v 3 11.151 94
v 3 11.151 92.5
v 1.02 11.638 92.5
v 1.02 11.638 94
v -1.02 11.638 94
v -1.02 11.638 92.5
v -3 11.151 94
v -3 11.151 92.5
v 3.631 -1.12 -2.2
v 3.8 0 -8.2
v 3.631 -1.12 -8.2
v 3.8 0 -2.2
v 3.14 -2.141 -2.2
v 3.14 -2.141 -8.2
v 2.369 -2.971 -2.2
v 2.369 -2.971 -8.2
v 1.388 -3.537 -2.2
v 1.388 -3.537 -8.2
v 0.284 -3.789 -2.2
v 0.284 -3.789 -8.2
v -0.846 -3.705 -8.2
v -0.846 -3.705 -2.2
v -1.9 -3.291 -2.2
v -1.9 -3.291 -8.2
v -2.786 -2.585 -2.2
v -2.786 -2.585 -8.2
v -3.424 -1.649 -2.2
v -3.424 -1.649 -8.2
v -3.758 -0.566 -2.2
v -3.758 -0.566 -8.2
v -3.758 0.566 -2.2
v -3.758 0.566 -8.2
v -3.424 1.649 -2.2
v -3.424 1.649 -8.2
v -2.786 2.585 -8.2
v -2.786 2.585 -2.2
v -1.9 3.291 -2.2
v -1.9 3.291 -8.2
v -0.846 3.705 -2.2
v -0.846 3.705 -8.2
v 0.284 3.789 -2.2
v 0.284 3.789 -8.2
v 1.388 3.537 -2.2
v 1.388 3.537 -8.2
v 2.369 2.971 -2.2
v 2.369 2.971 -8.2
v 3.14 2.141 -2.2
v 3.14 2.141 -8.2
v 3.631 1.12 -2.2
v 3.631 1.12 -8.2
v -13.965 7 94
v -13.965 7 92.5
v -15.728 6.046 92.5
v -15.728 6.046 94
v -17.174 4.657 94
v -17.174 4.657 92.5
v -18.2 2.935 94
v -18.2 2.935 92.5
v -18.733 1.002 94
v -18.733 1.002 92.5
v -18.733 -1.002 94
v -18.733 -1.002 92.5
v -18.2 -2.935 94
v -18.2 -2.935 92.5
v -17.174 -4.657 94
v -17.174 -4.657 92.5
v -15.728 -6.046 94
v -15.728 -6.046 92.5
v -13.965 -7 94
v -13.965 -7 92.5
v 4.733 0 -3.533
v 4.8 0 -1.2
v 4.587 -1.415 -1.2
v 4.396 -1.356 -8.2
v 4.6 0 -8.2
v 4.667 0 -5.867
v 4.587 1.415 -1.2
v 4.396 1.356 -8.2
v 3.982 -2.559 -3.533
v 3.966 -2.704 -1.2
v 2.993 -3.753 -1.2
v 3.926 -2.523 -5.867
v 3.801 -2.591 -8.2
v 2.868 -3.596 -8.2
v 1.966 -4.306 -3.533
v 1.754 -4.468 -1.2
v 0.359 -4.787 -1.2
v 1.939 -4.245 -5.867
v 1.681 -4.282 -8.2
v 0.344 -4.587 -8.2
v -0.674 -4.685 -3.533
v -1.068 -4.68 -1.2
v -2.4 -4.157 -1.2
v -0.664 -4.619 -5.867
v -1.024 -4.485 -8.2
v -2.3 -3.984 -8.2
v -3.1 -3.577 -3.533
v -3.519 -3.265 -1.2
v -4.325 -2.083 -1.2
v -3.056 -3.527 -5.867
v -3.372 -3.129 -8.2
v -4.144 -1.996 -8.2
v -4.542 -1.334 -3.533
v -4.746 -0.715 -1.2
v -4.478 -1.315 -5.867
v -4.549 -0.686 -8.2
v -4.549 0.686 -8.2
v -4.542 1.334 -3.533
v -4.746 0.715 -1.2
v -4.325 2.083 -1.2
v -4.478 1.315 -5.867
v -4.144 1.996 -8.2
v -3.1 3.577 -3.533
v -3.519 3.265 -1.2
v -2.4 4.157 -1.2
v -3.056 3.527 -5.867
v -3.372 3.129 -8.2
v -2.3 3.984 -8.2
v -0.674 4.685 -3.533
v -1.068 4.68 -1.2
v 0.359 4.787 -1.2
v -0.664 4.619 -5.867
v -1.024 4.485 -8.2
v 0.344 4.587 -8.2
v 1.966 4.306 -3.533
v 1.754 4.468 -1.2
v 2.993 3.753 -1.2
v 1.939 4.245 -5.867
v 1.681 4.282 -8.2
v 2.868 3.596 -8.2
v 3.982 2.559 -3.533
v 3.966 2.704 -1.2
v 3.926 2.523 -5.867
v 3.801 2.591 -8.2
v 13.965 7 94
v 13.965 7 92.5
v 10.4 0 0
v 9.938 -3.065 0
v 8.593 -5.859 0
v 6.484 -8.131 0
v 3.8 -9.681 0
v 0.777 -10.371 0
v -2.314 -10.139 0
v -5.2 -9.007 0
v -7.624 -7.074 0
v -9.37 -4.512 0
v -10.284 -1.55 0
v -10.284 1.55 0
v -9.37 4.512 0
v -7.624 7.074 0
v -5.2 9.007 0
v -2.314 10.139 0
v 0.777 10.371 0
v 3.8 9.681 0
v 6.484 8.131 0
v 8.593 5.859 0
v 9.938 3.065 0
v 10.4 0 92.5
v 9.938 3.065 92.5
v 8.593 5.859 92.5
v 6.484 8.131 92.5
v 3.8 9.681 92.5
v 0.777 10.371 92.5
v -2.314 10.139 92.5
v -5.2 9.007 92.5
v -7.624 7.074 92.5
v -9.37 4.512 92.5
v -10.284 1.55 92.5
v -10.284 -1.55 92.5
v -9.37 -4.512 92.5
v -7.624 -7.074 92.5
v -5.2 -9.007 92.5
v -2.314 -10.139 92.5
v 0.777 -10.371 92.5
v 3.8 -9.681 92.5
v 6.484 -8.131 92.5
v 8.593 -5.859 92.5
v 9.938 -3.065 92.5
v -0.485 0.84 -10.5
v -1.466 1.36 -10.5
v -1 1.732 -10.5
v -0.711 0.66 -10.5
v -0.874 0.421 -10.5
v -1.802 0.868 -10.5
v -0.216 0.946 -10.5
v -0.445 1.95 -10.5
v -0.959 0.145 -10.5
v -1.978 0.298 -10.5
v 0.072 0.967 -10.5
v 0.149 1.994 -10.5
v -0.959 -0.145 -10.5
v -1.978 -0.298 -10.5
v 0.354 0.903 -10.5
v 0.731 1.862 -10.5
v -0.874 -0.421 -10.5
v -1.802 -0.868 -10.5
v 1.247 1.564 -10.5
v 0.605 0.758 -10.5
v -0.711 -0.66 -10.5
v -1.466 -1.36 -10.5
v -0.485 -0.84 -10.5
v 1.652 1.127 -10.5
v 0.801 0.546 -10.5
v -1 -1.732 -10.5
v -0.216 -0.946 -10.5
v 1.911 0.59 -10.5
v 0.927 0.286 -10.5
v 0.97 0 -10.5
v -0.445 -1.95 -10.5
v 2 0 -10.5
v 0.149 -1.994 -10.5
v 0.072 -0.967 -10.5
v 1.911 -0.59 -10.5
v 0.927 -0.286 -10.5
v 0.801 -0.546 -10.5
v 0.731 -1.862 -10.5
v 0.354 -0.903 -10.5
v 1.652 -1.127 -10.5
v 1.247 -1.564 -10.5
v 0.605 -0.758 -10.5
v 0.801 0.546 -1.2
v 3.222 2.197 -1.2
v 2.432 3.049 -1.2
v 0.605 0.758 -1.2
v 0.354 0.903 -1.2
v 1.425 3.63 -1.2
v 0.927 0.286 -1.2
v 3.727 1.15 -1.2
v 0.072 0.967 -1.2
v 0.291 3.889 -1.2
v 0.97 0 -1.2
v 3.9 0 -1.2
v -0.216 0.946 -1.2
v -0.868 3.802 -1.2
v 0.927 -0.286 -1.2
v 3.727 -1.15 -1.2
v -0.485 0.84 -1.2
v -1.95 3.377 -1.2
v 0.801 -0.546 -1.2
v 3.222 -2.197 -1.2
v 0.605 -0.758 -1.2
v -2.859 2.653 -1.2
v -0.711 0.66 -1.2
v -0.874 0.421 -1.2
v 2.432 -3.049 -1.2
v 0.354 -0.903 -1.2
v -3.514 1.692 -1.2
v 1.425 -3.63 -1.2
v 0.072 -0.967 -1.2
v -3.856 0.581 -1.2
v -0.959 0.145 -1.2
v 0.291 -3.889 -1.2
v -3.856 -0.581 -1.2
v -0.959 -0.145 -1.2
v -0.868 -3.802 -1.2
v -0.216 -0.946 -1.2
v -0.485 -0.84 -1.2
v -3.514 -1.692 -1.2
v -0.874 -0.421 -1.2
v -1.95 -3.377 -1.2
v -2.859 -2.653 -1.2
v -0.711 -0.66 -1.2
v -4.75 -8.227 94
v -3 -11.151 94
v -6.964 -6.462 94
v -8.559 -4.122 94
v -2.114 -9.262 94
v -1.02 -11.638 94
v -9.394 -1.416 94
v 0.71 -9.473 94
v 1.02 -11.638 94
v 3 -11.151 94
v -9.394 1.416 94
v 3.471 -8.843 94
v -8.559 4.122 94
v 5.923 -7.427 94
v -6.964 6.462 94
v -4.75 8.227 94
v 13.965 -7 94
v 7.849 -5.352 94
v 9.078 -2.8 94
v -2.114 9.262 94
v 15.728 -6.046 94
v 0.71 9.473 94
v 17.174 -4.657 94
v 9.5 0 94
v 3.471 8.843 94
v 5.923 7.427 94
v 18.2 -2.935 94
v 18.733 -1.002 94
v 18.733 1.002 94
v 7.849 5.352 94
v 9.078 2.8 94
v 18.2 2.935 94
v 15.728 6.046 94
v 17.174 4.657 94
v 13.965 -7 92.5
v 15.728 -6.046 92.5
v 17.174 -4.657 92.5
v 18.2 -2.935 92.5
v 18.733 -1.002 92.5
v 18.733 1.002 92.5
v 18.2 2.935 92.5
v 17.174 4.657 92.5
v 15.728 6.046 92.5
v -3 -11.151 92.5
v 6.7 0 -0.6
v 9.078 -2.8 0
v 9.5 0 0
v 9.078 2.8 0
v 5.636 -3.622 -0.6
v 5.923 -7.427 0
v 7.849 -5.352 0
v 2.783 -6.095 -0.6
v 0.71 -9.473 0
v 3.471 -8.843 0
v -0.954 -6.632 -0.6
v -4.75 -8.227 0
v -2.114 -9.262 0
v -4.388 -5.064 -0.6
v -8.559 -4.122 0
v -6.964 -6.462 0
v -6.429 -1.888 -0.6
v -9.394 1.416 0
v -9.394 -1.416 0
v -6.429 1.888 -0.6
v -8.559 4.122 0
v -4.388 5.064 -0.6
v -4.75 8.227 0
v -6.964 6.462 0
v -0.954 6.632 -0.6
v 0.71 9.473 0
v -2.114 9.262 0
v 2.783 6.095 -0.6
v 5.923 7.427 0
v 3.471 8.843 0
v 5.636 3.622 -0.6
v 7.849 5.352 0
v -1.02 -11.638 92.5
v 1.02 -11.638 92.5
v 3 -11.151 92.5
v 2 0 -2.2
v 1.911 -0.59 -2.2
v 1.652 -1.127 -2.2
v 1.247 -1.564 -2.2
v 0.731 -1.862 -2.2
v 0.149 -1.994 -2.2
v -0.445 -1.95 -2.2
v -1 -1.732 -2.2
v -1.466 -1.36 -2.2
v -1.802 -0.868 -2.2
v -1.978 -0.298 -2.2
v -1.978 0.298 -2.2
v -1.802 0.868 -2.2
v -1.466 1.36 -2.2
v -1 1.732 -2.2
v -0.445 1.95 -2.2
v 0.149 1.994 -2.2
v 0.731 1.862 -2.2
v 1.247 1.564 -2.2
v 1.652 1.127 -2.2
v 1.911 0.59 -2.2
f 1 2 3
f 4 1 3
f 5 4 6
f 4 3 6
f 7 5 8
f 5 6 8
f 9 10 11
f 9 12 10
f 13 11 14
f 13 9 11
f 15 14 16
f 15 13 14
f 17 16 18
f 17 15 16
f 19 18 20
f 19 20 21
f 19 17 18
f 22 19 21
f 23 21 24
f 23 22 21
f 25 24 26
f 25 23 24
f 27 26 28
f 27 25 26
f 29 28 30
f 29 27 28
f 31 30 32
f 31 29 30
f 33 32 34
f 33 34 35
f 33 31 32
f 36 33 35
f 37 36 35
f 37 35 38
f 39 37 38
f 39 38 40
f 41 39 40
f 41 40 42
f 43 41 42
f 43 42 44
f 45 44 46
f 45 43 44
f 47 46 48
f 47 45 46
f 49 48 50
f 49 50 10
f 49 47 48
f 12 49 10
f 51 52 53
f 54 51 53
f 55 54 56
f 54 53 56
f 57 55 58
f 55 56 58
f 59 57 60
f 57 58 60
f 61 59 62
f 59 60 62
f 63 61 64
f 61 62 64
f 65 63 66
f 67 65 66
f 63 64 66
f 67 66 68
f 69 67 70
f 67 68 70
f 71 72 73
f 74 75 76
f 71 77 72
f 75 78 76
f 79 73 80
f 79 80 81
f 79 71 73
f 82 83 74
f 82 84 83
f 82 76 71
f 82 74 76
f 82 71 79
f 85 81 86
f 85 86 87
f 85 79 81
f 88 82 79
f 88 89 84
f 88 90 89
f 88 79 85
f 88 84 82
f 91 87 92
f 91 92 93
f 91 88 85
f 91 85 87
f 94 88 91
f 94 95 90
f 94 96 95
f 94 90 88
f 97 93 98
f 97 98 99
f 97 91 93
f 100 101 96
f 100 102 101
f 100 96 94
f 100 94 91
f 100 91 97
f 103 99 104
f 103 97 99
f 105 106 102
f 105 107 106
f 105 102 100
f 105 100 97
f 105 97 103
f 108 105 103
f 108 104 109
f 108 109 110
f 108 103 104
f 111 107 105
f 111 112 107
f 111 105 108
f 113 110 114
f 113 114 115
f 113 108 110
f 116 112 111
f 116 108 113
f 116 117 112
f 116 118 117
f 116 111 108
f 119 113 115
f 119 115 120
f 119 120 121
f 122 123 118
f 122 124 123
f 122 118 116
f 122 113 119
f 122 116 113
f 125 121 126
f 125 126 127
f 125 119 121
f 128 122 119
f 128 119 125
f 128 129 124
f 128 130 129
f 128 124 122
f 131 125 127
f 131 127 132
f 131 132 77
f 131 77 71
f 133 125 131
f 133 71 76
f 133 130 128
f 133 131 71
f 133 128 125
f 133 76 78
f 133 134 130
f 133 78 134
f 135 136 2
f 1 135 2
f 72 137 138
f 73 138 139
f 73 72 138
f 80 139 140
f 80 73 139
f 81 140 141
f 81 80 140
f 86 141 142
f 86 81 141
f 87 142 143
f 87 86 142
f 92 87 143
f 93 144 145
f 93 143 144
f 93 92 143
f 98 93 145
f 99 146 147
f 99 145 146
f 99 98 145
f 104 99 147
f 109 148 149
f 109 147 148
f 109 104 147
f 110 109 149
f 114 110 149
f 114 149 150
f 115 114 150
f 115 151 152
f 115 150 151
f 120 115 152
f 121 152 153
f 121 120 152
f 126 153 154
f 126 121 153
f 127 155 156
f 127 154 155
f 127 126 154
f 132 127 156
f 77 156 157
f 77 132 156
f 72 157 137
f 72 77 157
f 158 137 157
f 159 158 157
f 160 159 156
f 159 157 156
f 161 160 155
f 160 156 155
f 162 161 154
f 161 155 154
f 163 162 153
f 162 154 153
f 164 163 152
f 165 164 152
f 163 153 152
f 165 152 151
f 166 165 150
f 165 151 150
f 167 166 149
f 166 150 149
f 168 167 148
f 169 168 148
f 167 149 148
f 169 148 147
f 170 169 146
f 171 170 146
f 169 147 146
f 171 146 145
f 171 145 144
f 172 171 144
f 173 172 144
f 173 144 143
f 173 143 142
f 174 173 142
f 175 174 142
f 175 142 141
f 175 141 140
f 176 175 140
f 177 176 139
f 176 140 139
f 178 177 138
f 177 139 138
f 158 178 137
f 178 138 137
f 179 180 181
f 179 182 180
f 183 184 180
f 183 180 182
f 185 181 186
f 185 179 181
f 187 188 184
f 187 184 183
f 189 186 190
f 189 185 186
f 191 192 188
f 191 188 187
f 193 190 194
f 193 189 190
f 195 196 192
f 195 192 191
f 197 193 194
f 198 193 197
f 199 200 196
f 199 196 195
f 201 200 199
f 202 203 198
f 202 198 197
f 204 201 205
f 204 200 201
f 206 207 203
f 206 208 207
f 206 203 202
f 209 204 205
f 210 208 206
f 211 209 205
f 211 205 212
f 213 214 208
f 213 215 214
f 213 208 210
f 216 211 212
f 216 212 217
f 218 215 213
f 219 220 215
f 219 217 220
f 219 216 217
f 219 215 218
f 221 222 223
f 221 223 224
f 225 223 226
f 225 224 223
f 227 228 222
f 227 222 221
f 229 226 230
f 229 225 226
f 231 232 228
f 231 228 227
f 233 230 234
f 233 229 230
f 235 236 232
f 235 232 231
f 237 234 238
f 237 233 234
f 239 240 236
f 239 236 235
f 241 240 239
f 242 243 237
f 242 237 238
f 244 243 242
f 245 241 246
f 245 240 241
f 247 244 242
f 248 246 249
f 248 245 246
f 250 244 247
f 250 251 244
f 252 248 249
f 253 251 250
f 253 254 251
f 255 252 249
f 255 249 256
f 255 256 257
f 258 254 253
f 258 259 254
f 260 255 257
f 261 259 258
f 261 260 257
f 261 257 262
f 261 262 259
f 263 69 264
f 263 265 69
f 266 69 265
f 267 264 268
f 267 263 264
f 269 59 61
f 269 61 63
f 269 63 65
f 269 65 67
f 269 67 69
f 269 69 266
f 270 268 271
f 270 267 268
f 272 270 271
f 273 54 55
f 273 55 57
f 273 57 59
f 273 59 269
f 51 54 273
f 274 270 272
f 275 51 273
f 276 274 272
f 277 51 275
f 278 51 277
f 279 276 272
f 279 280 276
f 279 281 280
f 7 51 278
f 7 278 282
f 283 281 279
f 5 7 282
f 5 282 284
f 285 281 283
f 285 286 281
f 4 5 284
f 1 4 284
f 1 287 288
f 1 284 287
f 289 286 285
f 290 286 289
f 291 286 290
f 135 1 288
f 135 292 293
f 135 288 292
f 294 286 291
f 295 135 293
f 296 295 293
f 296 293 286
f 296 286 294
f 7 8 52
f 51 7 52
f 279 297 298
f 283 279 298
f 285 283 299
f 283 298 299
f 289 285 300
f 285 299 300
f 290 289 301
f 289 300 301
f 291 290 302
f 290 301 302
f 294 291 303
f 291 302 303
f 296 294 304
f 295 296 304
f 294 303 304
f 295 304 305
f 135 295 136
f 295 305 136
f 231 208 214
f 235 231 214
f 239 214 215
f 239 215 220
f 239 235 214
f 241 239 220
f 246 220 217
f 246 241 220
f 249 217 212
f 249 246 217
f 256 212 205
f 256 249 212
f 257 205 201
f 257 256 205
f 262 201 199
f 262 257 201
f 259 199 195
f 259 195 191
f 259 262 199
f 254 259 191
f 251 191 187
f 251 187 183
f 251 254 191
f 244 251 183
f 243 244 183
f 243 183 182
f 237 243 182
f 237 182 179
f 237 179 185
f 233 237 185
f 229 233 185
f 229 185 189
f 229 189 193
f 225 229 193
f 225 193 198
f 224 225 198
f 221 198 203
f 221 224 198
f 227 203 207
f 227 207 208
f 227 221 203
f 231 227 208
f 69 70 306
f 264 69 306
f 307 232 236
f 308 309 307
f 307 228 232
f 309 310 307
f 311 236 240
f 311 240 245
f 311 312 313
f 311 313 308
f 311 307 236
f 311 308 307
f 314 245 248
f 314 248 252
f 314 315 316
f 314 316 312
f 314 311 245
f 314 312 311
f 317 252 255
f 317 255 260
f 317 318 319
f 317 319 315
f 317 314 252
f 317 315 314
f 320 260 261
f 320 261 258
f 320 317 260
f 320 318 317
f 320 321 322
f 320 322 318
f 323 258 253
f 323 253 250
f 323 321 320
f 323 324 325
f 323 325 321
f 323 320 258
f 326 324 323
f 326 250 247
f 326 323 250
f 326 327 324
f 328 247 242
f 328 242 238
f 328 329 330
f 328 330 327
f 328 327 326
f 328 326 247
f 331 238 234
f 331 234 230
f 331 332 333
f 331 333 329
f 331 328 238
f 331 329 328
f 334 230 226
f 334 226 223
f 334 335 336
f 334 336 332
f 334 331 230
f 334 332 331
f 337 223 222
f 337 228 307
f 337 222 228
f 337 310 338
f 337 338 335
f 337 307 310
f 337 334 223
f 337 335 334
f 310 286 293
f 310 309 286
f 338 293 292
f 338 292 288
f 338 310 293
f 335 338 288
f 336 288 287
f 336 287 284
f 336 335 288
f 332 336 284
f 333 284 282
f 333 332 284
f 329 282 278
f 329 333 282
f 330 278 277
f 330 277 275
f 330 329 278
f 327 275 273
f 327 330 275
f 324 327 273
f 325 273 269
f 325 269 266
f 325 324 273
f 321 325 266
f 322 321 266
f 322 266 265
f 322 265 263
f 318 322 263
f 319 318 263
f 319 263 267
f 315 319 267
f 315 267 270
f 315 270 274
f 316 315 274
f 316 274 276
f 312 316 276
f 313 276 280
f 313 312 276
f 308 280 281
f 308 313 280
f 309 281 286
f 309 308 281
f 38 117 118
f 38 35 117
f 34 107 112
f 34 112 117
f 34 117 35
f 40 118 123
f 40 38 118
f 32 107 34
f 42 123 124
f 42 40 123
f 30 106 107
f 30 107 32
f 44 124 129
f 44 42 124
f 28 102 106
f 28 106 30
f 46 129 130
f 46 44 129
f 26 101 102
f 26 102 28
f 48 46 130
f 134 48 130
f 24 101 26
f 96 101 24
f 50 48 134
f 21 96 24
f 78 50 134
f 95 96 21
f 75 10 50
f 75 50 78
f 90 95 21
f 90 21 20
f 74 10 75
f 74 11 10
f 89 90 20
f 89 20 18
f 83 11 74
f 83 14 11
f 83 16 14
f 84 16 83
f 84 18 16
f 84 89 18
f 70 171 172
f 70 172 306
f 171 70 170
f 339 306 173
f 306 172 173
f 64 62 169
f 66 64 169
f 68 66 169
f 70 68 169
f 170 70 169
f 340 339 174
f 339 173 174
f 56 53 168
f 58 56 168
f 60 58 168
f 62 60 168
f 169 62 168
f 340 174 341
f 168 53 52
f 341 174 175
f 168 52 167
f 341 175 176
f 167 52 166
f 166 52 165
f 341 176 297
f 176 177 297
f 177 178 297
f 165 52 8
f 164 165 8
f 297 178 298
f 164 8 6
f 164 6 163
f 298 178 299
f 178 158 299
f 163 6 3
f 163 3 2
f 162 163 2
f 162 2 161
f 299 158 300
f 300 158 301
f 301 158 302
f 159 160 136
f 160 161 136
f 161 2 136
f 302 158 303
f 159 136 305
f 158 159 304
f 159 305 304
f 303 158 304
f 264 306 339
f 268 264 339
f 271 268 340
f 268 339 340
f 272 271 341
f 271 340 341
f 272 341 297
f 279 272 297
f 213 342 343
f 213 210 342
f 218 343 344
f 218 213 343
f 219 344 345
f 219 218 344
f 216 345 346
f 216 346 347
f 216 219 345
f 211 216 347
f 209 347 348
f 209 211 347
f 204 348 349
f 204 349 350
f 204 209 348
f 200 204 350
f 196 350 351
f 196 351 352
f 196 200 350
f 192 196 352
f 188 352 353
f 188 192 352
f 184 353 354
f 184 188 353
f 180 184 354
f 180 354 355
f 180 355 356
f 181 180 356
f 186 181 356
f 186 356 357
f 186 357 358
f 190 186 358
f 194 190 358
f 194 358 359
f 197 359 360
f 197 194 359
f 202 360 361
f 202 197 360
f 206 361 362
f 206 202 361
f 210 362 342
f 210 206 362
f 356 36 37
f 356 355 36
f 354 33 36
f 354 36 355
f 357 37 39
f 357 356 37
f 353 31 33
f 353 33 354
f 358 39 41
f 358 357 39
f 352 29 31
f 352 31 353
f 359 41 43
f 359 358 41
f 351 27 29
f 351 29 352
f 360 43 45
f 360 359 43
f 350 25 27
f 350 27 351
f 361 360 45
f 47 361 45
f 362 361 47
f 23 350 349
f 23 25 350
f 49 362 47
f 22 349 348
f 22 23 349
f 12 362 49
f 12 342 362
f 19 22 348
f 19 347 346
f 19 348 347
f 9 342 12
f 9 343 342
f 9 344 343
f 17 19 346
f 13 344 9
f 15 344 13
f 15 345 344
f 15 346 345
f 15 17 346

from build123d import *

# Parameters (mm, degrees)
SKETCH1_R           = 10.4
SKETCH1_R_2         = 9.5
BOSS_EXTRUDE1_DEPTH = 92.5
SKETCH3_R           = 9.5
BOSS_EXTRUDE2_DEPTH = 1.5


with BuildPart() as part:
    # Sketch1 → Boss-Extrude1 (new body)
    with BuildSketch(Plane.XY):
        Circle(SKETCH1_R)
        Circle(SKETCH1_R_2, mode=Mode.SUBTRACT)
    extrude(amount=BOSS_EXTRUDE1_DEPTH)

    # Sketch2 → Revolve1 (revolve)
    with BuildSketch(Plane(origin=(0, 0, 0), x_dir=(0, 0, -1), z_dir=(1, 0, 0)), mode=Mode.PRIVATE) as revolve1_sk:
        Polygon((0, 10.4), (1.2, 4.8), (8.2, 4.6), (8.2, 3.8), (2.2, 3.8), (2.2, 2), (10.5, 2), (10.5, 0.97), (1.2, 0.97), (1.2, 3.9), (0, 9.5), align=None)
    revolve(revolve1_sk.sketch.rotate(Axis((0, 0, 0), (0, 0, -1)), 90), axis=Axis((0, 0, 0), (0, 0, -1)))

    # Sketch3 → Boss-Extrude2 (add)
    with BuildSketch(Plane.XY.offset(92.5)):
        with BuildLine():
            Line((-3, 11.151145138), (-13.965196483, 7))
            ThreePointArc((-13.965196483, 7), (-18.8, 0), (-13.965196483, -7))
            Line((-13.965196483, -7), (-3, -11.151145138))
            ThreePointArc((-3, -11.151145138), (0, -11.7), (3, -11.151145138))
            Line((3, -11.151145138), (13.965196483, -7))
            ThreePointArc((13.965196483, -7), (18.8, 0), (13.965196483, 7))
            Line((13.965196483, 7), (3, 11.151145138))
            ThreePointArc((3, 11.151145138), (0, 11.7), (-3, 11.151145138))
        make_face()
        Circle(SKETCH3_R, mode=Mode.SUBTRACT)
    extrude(amount=BOSS_EXTRUDE2_DEPTH)


solid = part.part
